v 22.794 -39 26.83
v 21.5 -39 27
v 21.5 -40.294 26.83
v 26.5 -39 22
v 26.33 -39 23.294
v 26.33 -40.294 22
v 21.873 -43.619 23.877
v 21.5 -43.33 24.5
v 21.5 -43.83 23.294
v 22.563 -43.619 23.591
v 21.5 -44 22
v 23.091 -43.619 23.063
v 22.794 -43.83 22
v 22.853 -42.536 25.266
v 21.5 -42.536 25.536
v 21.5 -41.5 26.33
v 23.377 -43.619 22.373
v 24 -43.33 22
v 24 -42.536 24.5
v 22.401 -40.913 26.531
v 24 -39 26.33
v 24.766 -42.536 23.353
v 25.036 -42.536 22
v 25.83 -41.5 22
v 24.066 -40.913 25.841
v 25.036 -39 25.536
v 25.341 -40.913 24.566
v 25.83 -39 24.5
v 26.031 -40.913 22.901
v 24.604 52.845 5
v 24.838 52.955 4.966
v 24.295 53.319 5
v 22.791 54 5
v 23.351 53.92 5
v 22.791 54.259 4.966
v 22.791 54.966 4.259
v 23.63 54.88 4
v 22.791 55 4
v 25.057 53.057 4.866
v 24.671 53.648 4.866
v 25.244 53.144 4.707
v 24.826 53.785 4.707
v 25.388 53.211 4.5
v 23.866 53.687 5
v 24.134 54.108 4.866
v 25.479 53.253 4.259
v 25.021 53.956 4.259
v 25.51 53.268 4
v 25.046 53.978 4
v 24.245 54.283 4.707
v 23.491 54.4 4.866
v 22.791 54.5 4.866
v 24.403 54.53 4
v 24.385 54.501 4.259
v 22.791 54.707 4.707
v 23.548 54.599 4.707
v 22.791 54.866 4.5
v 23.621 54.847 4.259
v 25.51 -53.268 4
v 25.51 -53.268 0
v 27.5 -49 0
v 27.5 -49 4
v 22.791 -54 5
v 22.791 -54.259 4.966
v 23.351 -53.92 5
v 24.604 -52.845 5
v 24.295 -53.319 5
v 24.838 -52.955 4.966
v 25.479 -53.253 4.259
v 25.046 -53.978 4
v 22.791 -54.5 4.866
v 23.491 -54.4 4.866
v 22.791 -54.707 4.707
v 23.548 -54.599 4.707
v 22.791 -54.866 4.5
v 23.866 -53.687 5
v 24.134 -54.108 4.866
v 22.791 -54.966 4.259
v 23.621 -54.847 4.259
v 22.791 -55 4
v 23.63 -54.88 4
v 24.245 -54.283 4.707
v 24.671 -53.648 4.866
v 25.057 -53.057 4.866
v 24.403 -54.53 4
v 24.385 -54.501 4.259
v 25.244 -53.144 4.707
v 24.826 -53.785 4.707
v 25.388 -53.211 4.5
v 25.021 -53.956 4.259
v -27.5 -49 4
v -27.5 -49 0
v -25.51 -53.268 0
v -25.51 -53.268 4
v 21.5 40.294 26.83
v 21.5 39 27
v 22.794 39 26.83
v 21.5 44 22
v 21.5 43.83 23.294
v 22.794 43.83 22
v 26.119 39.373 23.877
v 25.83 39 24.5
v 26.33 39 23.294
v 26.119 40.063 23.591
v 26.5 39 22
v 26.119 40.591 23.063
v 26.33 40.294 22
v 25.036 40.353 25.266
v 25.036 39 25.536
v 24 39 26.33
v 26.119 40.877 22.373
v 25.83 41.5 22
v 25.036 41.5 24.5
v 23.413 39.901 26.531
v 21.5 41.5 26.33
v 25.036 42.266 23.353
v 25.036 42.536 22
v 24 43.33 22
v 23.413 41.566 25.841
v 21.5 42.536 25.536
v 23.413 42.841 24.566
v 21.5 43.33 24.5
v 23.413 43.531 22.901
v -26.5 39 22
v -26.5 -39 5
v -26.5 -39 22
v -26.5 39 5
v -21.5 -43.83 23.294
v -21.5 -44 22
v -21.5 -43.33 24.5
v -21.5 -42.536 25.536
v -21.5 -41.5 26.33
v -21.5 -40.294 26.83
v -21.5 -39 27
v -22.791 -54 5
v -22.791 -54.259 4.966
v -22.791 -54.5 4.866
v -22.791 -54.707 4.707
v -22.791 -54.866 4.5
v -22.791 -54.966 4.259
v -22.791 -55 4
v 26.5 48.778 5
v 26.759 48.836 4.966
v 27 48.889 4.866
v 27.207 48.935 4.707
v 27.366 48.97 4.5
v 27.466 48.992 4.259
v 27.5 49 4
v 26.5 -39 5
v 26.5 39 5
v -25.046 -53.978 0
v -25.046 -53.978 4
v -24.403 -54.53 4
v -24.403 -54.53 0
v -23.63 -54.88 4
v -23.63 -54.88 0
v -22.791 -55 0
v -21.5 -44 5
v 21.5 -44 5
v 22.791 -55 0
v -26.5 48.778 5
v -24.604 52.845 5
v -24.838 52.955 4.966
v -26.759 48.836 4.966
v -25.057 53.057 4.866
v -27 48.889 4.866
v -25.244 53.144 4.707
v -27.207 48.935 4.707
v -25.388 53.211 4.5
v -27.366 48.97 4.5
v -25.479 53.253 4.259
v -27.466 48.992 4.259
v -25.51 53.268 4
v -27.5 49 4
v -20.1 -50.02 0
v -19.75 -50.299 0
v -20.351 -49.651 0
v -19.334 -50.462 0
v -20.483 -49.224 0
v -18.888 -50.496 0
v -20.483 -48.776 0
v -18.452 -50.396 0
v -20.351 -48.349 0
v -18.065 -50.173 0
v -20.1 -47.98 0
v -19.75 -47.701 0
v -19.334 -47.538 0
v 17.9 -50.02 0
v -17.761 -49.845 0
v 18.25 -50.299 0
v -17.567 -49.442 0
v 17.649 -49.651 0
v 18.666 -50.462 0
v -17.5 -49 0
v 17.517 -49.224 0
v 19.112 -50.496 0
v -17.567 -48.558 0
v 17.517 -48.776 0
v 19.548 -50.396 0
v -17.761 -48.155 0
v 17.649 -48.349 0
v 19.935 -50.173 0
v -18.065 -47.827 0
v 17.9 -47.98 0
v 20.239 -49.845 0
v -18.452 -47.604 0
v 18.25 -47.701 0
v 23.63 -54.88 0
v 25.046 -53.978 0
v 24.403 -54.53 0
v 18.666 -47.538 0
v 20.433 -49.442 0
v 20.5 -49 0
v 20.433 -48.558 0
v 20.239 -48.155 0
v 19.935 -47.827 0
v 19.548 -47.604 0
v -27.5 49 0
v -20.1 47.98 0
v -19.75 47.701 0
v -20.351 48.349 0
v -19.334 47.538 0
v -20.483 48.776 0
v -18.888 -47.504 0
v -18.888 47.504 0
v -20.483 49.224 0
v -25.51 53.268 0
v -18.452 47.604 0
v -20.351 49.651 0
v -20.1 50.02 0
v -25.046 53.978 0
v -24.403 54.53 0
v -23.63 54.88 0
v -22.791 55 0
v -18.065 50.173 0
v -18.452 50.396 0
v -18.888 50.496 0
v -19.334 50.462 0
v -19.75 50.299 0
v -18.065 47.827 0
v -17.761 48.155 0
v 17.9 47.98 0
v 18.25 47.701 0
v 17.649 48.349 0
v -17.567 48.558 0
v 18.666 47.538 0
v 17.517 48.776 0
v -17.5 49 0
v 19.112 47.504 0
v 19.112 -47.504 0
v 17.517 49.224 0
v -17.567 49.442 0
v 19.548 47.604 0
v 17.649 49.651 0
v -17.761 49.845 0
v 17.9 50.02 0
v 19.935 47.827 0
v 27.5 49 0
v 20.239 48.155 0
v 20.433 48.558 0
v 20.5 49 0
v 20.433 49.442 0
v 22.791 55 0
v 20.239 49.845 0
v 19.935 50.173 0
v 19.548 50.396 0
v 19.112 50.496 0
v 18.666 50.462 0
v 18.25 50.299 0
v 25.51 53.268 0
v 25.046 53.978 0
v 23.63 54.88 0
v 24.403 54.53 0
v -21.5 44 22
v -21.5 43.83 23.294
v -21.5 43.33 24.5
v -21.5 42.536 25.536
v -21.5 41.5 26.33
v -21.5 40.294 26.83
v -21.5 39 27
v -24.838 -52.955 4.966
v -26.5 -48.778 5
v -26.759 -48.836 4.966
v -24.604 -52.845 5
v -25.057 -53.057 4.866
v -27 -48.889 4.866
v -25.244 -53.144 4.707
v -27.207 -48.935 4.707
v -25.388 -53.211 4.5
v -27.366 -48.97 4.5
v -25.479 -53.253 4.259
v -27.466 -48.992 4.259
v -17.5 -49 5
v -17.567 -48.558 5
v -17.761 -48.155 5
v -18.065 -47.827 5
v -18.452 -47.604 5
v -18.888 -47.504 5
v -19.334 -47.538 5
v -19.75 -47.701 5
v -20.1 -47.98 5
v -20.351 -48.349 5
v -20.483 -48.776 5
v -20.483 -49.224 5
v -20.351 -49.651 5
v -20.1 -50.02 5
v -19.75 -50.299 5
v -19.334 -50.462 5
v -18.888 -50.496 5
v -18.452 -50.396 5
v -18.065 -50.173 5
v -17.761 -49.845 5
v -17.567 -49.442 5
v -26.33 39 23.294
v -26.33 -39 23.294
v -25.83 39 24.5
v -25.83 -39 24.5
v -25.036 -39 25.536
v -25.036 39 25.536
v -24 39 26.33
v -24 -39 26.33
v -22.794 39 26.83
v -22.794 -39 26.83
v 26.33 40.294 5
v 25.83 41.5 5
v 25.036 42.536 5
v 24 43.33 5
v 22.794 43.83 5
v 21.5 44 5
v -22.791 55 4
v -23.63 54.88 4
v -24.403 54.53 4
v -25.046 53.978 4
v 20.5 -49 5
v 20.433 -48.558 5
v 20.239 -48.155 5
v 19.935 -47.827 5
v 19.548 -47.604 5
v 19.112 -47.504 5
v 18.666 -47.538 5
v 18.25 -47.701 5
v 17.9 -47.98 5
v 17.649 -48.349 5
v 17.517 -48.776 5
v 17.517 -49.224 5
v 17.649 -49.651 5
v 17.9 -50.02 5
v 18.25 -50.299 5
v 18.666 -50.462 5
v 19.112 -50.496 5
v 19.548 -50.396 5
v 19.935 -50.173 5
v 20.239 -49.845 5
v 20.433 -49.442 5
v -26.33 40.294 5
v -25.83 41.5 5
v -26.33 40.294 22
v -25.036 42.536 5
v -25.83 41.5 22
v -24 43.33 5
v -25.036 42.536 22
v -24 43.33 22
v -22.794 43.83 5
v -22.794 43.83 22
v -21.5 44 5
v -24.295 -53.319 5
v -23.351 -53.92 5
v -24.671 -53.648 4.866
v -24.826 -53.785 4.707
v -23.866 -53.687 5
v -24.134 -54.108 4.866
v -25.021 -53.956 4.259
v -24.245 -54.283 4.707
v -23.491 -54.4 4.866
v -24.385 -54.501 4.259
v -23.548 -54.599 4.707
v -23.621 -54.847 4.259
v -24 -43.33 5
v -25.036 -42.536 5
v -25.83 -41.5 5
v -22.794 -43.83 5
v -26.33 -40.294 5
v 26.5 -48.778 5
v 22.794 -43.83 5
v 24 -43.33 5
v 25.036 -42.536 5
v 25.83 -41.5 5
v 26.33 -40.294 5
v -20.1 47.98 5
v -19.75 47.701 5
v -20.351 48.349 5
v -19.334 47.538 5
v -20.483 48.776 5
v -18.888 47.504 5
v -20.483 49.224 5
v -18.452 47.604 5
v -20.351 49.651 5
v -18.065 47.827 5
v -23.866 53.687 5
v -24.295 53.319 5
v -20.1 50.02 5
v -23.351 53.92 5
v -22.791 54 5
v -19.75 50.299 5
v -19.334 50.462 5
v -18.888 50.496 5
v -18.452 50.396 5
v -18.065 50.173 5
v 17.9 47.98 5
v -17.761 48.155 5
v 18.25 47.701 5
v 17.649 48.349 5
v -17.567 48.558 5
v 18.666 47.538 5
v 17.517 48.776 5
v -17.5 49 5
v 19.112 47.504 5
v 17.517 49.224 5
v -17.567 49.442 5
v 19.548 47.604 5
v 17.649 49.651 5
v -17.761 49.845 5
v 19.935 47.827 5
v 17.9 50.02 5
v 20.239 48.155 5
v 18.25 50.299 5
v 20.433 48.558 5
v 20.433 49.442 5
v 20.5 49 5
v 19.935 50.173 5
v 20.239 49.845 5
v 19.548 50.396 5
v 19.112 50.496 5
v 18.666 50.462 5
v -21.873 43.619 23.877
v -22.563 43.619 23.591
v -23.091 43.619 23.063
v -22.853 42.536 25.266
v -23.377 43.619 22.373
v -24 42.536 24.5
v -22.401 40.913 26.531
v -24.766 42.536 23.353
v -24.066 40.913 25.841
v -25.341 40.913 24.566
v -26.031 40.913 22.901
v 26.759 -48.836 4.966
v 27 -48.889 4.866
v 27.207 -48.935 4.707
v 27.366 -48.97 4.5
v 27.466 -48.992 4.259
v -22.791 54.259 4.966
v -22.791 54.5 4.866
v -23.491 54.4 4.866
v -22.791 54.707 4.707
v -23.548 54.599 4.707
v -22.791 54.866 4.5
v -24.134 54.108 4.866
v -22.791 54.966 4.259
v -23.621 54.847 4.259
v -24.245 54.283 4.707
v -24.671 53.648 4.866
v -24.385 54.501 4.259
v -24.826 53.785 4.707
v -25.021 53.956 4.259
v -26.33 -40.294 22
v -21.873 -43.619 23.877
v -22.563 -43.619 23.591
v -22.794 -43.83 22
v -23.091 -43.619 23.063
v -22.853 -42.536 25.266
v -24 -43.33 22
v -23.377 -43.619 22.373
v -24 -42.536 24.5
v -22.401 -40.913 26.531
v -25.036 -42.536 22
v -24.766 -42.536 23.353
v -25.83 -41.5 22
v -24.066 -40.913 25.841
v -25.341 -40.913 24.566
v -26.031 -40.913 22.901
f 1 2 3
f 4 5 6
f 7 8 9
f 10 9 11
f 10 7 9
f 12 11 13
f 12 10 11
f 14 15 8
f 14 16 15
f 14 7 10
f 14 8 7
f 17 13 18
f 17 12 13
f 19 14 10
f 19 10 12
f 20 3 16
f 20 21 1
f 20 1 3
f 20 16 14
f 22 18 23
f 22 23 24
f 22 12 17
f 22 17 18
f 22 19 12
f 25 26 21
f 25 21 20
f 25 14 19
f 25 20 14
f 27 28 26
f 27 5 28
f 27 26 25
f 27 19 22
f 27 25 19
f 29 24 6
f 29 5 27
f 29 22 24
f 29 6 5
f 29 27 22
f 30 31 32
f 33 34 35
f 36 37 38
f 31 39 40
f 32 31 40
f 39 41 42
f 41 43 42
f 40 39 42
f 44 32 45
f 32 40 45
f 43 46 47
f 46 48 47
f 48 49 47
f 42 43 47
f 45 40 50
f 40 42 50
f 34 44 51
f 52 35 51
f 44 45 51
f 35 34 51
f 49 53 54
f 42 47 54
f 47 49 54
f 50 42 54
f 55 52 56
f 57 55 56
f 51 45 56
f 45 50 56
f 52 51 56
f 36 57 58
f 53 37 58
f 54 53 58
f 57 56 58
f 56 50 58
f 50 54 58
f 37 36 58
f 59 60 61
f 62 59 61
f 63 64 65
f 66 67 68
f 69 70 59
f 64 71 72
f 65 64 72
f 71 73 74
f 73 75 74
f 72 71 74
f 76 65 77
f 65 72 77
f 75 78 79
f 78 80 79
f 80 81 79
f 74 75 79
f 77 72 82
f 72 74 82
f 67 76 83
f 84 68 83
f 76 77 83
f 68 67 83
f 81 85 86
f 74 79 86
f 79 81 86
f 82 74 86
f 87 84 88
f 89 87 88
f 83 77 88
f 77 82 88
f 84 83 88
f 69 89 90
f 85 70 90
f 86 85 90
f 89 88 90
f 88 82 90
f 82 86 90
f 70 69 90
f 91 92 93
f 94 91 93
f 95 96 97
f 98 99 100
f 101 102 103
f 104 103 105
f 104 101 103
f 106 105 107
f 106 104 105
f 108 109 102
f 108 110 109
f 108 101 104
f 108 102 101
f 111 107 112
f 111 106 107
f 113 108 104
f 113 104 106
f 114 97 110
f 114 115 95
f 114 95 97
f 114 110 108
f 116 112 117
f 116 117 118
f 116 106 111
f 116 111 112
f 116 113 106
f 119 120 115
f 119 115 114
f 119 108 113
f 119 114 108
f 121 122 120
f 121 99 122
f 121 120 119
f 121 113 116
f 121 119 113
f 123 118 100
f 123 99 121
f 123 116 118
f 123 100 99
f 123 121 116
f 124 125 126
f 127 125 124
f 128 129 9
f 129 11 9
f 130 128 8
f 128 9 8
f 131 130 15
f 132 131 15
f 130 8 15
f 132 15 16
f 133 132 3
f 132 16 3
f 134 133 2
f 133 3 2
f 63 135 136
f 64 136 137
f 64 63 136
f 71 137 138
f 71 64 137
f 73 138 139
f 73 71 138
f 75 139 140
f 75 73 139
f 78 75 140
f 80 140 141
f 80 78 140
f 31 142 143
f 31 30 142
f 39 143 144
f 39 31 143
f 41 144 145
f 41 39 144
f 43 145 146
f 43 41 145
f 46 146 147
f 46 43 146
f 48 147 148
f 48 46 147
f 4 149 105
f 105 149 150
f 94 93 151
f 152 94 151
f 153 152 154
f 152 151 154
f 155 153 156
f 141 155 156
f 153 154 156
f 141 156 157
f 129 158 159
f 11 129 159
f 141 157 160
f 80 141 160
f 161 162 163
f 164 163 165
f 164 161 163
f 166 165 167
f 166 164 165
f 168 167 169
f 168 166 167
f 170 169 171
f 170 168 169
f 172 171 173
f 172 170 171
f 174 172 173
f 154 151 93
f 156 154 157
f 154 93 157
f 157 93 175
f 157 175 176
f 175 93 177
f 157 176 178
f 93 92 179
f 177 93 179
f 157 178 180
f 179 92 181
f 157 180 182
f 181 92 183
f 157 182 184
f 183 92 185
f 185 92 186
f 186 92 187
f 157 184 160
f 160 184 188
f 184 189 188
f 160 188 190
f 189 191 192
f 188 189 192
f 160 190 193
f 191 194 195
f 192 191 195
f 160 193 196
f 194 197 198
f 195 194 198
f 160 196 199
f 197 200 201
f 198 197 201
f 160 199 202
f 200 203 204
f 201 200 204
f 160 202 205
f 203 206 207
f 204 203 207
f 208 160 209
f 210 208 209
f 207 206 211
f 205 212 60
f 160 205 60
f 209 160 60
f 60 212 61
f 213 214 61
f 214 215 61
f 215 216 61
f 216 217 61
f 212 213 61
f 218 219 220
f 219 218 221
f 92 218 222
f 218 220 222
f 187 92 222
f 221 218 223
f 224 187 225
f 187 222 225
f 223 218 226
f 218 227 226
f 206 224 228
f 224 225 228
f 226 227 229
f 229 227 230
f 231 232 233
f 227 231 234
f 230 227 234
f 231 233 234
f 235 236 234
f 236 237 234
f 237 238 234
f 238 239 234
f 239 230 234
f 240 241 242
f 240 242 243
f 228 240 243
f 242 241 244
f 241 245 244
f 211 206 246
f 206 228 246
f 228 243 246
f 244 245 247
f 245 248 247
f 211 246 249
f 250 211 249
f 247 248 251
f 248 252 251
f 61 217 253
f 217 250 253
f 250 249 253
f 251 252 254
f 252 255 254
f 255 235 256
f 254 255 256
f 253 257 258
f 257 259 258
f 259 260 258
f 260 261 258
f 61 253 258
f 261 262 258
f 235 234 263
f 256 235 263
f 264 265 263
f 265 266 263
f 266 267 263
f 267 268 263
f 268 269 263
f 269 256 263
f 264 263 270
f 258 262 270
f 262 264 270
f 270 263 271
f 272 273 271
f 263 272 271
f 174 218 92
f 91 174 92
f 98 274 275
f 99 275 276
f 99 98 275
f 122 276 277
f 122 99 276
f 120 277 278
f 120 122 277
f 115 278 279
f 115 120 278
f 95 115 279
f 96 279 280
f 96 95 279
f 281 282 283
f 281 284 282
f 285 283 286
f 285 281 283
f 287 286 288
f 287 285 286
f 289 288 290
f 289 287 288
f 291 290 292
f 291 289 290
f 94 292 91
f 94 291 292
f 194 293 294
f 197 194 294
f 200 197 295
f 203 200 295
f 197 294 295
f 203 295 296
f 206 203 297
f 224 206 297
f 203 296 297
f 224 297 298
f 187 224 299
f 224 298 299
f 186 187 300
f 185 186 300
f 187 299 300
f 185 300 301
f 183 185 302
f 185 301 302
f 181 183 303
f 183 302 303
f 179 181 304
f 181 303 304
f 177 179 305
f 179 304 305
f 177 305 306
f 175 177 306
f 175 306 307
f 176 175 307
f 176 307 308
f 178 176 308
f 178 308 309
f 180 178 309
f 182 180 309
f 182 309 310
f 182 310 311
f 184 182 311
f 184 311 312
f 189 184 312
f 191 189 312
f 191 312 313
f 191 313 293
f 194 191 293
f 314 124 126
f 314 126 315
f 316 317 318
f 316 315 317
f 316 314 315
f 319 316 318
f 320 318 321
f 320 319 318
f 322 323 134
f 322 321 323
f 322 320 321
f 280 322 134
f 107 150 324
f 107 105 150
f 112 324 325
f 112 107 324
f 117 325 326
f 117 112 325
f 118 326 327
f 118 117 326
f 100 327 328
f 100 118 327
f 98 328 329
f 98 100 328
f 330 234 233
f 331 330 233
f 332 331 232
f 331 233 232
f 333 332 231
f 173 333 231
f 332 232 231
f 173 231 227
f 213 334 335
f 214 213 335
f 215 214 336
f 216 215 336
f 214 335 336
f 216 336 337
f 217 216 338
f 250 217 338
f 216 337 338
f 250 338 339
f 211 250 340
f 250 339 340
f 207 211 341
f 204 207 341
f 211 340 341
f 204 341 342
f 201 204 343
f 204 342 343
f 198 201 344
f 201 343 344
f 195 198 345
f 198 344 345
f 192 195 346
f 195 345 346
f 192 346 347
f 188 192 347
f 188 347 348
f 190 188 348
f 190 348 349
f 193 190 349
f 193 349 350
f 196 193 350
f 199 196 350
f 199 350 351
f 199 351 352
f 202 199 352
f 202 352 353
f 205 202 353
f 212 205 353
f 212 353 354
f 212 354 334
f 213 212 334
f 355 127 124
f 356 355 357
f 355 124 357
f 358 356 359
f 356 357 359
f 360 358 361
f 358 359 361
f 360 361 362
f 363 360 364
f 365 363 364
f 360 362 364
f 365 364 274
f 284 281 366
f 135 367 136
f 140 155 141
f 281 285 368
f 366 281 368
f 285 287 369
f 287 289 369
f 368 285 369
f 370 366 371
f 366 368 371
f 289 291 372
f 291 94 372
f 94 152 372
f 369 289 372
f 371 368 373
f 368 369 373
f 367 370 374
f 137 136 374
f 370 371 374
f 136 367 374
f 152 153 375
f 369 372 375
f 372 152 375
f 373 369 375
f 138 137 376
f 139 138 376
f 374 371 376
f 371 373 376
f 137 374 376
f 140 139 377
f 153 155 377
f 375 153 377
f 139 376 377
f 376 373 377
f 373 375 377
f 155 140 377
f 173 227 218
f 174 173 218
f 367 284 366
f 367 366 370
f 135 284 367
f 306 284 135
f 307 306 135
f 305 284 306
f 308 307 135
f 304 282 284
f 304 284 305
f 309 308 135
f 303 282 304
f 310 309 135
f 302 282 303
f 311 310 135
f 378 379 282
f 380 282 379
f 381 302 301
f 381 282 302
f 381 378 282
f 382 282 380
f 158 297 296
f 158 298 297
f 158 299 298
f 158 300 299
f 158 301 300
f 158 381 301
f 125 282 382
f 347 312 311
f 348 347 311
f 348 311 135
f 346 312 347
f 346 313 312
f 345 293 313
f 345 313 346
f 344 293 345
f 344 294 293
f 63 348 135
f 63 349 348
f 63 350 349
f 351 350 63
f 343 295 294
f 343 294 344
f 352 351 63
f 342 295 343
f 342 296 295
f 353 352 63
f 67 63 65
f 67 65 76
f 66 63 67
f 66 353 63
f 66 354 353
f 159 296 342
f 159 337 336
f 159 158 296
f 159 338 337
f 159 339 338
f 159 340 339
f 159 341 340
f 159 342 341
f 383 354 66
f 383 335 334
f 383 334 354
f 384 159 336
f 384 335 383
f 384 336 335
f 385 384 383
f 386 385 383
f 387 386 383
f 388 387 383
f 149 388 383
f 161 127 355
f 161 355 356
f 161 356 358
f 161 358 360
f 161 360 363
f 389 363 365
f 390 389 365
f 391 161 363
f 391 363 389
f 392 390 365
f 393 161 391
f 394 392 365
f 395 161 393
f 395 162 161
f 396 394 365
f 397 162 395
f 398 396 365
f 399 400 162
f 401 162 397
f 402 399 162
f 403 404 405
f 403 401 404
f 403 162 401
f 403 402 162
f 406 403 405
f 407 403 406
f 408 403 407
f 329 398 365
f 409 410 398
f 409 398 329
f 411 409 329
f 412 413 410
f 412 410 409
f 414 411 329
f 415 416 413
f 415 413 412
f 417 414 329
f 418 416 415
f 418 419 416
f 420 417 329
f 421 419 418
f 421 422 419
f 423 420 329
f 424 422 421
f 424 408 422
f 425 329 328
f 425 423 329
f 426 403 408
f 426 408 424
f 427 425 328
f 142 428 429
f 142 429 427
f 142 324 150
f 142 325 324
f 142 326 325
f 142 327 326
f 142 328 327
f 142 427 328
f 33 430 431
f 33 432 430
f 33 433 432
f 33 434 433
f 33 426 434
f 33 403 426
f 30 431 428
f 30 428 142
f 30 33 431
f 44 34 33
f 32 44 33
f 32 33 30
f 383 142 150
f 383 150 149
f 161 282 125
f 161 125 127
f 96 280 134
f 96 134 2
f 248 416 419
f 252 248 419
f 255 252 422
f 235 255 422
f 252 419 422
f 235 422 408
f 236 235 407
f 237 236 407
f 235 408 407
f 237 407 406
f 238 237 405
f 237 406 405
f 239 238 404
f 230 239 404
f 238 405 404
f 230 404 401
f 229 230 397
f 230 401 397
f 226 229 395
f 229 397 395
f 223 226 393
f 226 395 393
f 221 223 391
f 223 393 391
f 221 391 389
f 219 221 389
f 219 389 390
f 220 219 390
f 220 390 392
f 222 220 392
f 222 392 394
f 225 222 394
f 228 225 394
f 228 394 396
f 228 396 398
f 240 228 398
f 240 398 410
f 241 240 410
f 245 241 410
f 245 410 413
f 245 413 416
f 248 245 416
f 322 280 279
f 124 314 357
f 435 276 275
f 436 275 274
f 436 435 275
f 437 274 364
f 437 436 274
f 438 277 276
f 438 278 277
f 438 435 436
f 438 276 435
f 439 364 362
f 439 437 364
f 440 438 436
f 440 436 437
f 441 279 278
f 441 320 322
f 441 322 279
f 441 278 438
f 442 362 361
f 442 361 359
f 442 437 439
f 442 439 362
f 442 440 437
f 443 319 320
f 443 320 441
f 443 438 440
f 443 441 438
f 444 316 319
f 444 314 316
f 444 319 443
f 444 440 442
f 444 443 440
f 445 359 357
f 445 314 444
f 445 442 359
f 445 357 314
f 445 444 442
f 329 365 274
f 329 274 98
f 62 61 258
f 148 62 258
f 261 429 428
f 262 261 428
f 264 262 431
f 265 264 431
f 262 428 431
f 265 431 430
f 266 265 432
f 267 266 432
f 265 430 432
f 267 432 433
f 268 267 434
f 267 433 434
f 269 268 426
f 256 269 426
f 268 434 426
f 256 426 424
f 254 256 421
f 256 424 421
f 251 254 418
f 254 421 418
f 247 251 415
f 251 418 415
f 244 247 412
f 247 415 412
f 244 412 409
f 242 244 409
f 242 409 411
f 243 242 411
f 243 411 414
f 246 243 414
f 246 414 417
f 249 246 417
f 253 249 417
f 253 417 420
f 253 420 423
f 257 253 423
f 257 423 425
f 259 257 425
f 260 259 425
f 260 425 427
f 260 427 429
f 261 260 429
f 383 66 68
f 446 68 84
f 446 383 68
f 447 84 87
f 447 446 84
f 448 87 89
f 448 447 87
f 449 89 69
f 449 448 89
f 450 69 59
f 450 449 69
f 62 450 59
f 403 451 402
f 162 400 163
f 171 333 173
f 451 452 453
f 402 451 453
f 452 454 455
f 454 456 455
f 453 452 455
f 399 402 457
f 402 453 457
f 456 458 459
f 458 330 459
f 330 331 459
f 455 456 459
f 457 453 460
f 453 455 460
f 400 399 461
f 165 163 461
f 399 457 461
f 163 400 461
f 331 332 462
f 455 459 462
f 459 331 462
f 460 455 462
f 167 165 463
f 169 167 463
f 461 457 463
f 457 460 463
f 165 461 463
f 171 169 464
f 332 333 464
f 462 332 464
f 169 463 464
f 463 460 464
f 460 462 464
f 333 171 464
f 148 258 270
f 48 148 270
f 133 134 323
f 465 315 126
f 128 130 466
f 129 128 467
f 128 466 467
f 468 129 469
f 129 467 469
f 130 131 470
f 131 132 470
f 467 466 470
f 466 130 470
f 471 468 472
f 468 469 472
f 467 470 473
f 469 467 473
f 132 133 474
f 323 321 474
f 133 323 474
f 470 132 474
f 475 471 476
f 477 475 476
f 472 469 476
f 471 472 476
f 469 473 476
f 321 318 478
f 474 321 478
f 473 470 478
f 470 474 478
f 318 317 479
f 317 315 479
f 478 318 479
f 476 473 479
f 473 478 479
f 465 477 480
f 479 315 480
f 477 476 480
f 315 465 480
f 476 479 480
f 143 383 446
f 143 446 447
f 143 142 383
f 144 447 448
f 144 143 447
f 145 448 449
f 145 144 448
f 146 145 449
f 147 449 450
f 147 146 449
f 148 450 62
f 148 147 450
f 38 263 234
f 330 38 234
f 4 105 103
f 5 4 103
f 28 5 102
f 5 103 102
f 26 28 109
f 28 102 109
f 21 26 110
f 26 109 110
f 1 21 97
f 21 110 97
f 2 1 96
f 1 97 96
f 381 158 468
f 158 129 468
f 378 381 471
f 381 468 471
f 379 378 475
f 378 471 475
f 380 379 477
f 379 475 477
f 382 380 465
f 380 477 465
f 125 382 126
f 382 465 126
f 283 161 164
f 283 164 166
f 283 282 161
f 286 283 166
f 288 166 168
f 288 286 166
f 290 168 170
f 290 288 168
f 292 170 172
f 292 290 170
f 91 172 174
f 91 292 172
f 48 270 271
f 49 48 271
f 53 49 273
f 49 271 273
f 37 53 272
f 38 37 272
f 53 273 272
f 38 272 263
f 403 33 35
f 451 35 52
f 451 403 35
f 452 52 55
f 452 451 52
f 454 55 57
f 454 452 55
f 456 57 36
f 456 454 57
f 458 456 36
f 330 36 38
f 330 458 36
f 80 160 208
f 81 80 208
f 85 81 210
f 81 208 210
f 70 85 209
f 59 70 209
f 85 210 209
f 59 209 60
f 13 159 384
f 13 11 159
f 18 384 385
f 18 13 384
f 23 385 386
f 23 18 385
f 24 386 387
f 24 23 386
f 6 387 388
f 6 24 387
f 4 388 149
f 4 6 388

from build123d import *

# Parameters (mm, degrees)
F1_DEPTH = 5
F2_W     = 53
F2_H     = 88
F3_DEPTH = 22
F4_R     = 1.5
F5_DEPTH = 25
F6_R     = 5
F7_R     = 0.99999


# Not quite as in the source:
# - a fillet or chamfer is up to 0.001 mm smaller than in the source, because OpenCascade refuses the exact size


with BuildPart() as f1:
    # F0 (on Top) → F1 (new body)
    with BuildSketch(Plane.XY):
        with BuildLine():
            Line((22.7909432686, 55), (-22.7909432686, 55))
            ThreePointArc((-22.7909432686, 55), (-24.4028420937, 54.5301743374), (-25.5098666298, 53.2678547852))
            Line((-25.5098666298, 53.2678547852), (-27.5, 49))
            Line((-27.5, 49), (-27.5, -49))
            Line((-27.5, -49), (-25.5098666298, -53.2678547852))
            ThreePointArc((-25.5098666298, -53.2678547852), (-24.4028420937, -54.5301743374), (-22.7909432686, -55))
            Line((-22.7909432686, -55), (22.7909432686, -55))
            ThreePointArc((22.7909432686, -55), (24.4028420937, -54.5301743374), (25.5098666298, -53.2678547852))
            Line((25.5098666298, -53.2678547852), (27.5, -49))
            Line((27.5, -49), (27.5, 49))
            Line((27.5, 49), (25.5098666298, 53.2678547852))
            ThreePointArc((25.5098666298, 53.2678547852), (24.4028420937, 54.5301743374), (22.7909432686, 55))
        make_face()
    extrude(amount=F1_DEPTH)

    # F2 (on face) → F3 (join)
    with BuildSketch(Plane.XY.offset(5)):
        Rectangle(F2_W, F2_H)
    extrude(amount=F3_DEPTH)

    # F4 (on face) → F5 (cut)
    with BuildSketch(Plane.XY.offset(5)):
        with Locations((-19, 49)):
            Circle(F4_R)
        with Locations((19, 49)):
            Circle(F4_R)
        with Locations((-19, -49)):
            Circle(F4_R)
        with Locations((19, -49)):
            Circle(F4_R)
    extrude(amount=-F5_DEPTH, mode=Mode.SUBTRACT)

    # F6
    f6_edges = [f1.edges().sort_by_distance(p)[0] for p in [
        (-26.5, 0, 27),
        (0, 44, 27),
        (26.5, 0, 27),
        (0, -44, 27),
        (26.5, -44, 16),
        (26.5, 44, 16),
        (-26.5, 44, 16),
        (-26.5, -44, 16),
    ]]
    fillet(f6_edges, radius=F6_R)

    # F7 (radius 1 in the source; OpenCascade refuses exactly that, so slightly less here)
    f7_edges = [f1.edges().sort_by_distance(p)[0] for p in [
        (27.5, 0, 5),
        (26.504933, -51.133927, 5),
        (26.504933, 51.133927, 5),
        (-27.5, 0, 5),
    ]]
    fillet(f7_edges, radius=F7_R)


solid = f1.part
